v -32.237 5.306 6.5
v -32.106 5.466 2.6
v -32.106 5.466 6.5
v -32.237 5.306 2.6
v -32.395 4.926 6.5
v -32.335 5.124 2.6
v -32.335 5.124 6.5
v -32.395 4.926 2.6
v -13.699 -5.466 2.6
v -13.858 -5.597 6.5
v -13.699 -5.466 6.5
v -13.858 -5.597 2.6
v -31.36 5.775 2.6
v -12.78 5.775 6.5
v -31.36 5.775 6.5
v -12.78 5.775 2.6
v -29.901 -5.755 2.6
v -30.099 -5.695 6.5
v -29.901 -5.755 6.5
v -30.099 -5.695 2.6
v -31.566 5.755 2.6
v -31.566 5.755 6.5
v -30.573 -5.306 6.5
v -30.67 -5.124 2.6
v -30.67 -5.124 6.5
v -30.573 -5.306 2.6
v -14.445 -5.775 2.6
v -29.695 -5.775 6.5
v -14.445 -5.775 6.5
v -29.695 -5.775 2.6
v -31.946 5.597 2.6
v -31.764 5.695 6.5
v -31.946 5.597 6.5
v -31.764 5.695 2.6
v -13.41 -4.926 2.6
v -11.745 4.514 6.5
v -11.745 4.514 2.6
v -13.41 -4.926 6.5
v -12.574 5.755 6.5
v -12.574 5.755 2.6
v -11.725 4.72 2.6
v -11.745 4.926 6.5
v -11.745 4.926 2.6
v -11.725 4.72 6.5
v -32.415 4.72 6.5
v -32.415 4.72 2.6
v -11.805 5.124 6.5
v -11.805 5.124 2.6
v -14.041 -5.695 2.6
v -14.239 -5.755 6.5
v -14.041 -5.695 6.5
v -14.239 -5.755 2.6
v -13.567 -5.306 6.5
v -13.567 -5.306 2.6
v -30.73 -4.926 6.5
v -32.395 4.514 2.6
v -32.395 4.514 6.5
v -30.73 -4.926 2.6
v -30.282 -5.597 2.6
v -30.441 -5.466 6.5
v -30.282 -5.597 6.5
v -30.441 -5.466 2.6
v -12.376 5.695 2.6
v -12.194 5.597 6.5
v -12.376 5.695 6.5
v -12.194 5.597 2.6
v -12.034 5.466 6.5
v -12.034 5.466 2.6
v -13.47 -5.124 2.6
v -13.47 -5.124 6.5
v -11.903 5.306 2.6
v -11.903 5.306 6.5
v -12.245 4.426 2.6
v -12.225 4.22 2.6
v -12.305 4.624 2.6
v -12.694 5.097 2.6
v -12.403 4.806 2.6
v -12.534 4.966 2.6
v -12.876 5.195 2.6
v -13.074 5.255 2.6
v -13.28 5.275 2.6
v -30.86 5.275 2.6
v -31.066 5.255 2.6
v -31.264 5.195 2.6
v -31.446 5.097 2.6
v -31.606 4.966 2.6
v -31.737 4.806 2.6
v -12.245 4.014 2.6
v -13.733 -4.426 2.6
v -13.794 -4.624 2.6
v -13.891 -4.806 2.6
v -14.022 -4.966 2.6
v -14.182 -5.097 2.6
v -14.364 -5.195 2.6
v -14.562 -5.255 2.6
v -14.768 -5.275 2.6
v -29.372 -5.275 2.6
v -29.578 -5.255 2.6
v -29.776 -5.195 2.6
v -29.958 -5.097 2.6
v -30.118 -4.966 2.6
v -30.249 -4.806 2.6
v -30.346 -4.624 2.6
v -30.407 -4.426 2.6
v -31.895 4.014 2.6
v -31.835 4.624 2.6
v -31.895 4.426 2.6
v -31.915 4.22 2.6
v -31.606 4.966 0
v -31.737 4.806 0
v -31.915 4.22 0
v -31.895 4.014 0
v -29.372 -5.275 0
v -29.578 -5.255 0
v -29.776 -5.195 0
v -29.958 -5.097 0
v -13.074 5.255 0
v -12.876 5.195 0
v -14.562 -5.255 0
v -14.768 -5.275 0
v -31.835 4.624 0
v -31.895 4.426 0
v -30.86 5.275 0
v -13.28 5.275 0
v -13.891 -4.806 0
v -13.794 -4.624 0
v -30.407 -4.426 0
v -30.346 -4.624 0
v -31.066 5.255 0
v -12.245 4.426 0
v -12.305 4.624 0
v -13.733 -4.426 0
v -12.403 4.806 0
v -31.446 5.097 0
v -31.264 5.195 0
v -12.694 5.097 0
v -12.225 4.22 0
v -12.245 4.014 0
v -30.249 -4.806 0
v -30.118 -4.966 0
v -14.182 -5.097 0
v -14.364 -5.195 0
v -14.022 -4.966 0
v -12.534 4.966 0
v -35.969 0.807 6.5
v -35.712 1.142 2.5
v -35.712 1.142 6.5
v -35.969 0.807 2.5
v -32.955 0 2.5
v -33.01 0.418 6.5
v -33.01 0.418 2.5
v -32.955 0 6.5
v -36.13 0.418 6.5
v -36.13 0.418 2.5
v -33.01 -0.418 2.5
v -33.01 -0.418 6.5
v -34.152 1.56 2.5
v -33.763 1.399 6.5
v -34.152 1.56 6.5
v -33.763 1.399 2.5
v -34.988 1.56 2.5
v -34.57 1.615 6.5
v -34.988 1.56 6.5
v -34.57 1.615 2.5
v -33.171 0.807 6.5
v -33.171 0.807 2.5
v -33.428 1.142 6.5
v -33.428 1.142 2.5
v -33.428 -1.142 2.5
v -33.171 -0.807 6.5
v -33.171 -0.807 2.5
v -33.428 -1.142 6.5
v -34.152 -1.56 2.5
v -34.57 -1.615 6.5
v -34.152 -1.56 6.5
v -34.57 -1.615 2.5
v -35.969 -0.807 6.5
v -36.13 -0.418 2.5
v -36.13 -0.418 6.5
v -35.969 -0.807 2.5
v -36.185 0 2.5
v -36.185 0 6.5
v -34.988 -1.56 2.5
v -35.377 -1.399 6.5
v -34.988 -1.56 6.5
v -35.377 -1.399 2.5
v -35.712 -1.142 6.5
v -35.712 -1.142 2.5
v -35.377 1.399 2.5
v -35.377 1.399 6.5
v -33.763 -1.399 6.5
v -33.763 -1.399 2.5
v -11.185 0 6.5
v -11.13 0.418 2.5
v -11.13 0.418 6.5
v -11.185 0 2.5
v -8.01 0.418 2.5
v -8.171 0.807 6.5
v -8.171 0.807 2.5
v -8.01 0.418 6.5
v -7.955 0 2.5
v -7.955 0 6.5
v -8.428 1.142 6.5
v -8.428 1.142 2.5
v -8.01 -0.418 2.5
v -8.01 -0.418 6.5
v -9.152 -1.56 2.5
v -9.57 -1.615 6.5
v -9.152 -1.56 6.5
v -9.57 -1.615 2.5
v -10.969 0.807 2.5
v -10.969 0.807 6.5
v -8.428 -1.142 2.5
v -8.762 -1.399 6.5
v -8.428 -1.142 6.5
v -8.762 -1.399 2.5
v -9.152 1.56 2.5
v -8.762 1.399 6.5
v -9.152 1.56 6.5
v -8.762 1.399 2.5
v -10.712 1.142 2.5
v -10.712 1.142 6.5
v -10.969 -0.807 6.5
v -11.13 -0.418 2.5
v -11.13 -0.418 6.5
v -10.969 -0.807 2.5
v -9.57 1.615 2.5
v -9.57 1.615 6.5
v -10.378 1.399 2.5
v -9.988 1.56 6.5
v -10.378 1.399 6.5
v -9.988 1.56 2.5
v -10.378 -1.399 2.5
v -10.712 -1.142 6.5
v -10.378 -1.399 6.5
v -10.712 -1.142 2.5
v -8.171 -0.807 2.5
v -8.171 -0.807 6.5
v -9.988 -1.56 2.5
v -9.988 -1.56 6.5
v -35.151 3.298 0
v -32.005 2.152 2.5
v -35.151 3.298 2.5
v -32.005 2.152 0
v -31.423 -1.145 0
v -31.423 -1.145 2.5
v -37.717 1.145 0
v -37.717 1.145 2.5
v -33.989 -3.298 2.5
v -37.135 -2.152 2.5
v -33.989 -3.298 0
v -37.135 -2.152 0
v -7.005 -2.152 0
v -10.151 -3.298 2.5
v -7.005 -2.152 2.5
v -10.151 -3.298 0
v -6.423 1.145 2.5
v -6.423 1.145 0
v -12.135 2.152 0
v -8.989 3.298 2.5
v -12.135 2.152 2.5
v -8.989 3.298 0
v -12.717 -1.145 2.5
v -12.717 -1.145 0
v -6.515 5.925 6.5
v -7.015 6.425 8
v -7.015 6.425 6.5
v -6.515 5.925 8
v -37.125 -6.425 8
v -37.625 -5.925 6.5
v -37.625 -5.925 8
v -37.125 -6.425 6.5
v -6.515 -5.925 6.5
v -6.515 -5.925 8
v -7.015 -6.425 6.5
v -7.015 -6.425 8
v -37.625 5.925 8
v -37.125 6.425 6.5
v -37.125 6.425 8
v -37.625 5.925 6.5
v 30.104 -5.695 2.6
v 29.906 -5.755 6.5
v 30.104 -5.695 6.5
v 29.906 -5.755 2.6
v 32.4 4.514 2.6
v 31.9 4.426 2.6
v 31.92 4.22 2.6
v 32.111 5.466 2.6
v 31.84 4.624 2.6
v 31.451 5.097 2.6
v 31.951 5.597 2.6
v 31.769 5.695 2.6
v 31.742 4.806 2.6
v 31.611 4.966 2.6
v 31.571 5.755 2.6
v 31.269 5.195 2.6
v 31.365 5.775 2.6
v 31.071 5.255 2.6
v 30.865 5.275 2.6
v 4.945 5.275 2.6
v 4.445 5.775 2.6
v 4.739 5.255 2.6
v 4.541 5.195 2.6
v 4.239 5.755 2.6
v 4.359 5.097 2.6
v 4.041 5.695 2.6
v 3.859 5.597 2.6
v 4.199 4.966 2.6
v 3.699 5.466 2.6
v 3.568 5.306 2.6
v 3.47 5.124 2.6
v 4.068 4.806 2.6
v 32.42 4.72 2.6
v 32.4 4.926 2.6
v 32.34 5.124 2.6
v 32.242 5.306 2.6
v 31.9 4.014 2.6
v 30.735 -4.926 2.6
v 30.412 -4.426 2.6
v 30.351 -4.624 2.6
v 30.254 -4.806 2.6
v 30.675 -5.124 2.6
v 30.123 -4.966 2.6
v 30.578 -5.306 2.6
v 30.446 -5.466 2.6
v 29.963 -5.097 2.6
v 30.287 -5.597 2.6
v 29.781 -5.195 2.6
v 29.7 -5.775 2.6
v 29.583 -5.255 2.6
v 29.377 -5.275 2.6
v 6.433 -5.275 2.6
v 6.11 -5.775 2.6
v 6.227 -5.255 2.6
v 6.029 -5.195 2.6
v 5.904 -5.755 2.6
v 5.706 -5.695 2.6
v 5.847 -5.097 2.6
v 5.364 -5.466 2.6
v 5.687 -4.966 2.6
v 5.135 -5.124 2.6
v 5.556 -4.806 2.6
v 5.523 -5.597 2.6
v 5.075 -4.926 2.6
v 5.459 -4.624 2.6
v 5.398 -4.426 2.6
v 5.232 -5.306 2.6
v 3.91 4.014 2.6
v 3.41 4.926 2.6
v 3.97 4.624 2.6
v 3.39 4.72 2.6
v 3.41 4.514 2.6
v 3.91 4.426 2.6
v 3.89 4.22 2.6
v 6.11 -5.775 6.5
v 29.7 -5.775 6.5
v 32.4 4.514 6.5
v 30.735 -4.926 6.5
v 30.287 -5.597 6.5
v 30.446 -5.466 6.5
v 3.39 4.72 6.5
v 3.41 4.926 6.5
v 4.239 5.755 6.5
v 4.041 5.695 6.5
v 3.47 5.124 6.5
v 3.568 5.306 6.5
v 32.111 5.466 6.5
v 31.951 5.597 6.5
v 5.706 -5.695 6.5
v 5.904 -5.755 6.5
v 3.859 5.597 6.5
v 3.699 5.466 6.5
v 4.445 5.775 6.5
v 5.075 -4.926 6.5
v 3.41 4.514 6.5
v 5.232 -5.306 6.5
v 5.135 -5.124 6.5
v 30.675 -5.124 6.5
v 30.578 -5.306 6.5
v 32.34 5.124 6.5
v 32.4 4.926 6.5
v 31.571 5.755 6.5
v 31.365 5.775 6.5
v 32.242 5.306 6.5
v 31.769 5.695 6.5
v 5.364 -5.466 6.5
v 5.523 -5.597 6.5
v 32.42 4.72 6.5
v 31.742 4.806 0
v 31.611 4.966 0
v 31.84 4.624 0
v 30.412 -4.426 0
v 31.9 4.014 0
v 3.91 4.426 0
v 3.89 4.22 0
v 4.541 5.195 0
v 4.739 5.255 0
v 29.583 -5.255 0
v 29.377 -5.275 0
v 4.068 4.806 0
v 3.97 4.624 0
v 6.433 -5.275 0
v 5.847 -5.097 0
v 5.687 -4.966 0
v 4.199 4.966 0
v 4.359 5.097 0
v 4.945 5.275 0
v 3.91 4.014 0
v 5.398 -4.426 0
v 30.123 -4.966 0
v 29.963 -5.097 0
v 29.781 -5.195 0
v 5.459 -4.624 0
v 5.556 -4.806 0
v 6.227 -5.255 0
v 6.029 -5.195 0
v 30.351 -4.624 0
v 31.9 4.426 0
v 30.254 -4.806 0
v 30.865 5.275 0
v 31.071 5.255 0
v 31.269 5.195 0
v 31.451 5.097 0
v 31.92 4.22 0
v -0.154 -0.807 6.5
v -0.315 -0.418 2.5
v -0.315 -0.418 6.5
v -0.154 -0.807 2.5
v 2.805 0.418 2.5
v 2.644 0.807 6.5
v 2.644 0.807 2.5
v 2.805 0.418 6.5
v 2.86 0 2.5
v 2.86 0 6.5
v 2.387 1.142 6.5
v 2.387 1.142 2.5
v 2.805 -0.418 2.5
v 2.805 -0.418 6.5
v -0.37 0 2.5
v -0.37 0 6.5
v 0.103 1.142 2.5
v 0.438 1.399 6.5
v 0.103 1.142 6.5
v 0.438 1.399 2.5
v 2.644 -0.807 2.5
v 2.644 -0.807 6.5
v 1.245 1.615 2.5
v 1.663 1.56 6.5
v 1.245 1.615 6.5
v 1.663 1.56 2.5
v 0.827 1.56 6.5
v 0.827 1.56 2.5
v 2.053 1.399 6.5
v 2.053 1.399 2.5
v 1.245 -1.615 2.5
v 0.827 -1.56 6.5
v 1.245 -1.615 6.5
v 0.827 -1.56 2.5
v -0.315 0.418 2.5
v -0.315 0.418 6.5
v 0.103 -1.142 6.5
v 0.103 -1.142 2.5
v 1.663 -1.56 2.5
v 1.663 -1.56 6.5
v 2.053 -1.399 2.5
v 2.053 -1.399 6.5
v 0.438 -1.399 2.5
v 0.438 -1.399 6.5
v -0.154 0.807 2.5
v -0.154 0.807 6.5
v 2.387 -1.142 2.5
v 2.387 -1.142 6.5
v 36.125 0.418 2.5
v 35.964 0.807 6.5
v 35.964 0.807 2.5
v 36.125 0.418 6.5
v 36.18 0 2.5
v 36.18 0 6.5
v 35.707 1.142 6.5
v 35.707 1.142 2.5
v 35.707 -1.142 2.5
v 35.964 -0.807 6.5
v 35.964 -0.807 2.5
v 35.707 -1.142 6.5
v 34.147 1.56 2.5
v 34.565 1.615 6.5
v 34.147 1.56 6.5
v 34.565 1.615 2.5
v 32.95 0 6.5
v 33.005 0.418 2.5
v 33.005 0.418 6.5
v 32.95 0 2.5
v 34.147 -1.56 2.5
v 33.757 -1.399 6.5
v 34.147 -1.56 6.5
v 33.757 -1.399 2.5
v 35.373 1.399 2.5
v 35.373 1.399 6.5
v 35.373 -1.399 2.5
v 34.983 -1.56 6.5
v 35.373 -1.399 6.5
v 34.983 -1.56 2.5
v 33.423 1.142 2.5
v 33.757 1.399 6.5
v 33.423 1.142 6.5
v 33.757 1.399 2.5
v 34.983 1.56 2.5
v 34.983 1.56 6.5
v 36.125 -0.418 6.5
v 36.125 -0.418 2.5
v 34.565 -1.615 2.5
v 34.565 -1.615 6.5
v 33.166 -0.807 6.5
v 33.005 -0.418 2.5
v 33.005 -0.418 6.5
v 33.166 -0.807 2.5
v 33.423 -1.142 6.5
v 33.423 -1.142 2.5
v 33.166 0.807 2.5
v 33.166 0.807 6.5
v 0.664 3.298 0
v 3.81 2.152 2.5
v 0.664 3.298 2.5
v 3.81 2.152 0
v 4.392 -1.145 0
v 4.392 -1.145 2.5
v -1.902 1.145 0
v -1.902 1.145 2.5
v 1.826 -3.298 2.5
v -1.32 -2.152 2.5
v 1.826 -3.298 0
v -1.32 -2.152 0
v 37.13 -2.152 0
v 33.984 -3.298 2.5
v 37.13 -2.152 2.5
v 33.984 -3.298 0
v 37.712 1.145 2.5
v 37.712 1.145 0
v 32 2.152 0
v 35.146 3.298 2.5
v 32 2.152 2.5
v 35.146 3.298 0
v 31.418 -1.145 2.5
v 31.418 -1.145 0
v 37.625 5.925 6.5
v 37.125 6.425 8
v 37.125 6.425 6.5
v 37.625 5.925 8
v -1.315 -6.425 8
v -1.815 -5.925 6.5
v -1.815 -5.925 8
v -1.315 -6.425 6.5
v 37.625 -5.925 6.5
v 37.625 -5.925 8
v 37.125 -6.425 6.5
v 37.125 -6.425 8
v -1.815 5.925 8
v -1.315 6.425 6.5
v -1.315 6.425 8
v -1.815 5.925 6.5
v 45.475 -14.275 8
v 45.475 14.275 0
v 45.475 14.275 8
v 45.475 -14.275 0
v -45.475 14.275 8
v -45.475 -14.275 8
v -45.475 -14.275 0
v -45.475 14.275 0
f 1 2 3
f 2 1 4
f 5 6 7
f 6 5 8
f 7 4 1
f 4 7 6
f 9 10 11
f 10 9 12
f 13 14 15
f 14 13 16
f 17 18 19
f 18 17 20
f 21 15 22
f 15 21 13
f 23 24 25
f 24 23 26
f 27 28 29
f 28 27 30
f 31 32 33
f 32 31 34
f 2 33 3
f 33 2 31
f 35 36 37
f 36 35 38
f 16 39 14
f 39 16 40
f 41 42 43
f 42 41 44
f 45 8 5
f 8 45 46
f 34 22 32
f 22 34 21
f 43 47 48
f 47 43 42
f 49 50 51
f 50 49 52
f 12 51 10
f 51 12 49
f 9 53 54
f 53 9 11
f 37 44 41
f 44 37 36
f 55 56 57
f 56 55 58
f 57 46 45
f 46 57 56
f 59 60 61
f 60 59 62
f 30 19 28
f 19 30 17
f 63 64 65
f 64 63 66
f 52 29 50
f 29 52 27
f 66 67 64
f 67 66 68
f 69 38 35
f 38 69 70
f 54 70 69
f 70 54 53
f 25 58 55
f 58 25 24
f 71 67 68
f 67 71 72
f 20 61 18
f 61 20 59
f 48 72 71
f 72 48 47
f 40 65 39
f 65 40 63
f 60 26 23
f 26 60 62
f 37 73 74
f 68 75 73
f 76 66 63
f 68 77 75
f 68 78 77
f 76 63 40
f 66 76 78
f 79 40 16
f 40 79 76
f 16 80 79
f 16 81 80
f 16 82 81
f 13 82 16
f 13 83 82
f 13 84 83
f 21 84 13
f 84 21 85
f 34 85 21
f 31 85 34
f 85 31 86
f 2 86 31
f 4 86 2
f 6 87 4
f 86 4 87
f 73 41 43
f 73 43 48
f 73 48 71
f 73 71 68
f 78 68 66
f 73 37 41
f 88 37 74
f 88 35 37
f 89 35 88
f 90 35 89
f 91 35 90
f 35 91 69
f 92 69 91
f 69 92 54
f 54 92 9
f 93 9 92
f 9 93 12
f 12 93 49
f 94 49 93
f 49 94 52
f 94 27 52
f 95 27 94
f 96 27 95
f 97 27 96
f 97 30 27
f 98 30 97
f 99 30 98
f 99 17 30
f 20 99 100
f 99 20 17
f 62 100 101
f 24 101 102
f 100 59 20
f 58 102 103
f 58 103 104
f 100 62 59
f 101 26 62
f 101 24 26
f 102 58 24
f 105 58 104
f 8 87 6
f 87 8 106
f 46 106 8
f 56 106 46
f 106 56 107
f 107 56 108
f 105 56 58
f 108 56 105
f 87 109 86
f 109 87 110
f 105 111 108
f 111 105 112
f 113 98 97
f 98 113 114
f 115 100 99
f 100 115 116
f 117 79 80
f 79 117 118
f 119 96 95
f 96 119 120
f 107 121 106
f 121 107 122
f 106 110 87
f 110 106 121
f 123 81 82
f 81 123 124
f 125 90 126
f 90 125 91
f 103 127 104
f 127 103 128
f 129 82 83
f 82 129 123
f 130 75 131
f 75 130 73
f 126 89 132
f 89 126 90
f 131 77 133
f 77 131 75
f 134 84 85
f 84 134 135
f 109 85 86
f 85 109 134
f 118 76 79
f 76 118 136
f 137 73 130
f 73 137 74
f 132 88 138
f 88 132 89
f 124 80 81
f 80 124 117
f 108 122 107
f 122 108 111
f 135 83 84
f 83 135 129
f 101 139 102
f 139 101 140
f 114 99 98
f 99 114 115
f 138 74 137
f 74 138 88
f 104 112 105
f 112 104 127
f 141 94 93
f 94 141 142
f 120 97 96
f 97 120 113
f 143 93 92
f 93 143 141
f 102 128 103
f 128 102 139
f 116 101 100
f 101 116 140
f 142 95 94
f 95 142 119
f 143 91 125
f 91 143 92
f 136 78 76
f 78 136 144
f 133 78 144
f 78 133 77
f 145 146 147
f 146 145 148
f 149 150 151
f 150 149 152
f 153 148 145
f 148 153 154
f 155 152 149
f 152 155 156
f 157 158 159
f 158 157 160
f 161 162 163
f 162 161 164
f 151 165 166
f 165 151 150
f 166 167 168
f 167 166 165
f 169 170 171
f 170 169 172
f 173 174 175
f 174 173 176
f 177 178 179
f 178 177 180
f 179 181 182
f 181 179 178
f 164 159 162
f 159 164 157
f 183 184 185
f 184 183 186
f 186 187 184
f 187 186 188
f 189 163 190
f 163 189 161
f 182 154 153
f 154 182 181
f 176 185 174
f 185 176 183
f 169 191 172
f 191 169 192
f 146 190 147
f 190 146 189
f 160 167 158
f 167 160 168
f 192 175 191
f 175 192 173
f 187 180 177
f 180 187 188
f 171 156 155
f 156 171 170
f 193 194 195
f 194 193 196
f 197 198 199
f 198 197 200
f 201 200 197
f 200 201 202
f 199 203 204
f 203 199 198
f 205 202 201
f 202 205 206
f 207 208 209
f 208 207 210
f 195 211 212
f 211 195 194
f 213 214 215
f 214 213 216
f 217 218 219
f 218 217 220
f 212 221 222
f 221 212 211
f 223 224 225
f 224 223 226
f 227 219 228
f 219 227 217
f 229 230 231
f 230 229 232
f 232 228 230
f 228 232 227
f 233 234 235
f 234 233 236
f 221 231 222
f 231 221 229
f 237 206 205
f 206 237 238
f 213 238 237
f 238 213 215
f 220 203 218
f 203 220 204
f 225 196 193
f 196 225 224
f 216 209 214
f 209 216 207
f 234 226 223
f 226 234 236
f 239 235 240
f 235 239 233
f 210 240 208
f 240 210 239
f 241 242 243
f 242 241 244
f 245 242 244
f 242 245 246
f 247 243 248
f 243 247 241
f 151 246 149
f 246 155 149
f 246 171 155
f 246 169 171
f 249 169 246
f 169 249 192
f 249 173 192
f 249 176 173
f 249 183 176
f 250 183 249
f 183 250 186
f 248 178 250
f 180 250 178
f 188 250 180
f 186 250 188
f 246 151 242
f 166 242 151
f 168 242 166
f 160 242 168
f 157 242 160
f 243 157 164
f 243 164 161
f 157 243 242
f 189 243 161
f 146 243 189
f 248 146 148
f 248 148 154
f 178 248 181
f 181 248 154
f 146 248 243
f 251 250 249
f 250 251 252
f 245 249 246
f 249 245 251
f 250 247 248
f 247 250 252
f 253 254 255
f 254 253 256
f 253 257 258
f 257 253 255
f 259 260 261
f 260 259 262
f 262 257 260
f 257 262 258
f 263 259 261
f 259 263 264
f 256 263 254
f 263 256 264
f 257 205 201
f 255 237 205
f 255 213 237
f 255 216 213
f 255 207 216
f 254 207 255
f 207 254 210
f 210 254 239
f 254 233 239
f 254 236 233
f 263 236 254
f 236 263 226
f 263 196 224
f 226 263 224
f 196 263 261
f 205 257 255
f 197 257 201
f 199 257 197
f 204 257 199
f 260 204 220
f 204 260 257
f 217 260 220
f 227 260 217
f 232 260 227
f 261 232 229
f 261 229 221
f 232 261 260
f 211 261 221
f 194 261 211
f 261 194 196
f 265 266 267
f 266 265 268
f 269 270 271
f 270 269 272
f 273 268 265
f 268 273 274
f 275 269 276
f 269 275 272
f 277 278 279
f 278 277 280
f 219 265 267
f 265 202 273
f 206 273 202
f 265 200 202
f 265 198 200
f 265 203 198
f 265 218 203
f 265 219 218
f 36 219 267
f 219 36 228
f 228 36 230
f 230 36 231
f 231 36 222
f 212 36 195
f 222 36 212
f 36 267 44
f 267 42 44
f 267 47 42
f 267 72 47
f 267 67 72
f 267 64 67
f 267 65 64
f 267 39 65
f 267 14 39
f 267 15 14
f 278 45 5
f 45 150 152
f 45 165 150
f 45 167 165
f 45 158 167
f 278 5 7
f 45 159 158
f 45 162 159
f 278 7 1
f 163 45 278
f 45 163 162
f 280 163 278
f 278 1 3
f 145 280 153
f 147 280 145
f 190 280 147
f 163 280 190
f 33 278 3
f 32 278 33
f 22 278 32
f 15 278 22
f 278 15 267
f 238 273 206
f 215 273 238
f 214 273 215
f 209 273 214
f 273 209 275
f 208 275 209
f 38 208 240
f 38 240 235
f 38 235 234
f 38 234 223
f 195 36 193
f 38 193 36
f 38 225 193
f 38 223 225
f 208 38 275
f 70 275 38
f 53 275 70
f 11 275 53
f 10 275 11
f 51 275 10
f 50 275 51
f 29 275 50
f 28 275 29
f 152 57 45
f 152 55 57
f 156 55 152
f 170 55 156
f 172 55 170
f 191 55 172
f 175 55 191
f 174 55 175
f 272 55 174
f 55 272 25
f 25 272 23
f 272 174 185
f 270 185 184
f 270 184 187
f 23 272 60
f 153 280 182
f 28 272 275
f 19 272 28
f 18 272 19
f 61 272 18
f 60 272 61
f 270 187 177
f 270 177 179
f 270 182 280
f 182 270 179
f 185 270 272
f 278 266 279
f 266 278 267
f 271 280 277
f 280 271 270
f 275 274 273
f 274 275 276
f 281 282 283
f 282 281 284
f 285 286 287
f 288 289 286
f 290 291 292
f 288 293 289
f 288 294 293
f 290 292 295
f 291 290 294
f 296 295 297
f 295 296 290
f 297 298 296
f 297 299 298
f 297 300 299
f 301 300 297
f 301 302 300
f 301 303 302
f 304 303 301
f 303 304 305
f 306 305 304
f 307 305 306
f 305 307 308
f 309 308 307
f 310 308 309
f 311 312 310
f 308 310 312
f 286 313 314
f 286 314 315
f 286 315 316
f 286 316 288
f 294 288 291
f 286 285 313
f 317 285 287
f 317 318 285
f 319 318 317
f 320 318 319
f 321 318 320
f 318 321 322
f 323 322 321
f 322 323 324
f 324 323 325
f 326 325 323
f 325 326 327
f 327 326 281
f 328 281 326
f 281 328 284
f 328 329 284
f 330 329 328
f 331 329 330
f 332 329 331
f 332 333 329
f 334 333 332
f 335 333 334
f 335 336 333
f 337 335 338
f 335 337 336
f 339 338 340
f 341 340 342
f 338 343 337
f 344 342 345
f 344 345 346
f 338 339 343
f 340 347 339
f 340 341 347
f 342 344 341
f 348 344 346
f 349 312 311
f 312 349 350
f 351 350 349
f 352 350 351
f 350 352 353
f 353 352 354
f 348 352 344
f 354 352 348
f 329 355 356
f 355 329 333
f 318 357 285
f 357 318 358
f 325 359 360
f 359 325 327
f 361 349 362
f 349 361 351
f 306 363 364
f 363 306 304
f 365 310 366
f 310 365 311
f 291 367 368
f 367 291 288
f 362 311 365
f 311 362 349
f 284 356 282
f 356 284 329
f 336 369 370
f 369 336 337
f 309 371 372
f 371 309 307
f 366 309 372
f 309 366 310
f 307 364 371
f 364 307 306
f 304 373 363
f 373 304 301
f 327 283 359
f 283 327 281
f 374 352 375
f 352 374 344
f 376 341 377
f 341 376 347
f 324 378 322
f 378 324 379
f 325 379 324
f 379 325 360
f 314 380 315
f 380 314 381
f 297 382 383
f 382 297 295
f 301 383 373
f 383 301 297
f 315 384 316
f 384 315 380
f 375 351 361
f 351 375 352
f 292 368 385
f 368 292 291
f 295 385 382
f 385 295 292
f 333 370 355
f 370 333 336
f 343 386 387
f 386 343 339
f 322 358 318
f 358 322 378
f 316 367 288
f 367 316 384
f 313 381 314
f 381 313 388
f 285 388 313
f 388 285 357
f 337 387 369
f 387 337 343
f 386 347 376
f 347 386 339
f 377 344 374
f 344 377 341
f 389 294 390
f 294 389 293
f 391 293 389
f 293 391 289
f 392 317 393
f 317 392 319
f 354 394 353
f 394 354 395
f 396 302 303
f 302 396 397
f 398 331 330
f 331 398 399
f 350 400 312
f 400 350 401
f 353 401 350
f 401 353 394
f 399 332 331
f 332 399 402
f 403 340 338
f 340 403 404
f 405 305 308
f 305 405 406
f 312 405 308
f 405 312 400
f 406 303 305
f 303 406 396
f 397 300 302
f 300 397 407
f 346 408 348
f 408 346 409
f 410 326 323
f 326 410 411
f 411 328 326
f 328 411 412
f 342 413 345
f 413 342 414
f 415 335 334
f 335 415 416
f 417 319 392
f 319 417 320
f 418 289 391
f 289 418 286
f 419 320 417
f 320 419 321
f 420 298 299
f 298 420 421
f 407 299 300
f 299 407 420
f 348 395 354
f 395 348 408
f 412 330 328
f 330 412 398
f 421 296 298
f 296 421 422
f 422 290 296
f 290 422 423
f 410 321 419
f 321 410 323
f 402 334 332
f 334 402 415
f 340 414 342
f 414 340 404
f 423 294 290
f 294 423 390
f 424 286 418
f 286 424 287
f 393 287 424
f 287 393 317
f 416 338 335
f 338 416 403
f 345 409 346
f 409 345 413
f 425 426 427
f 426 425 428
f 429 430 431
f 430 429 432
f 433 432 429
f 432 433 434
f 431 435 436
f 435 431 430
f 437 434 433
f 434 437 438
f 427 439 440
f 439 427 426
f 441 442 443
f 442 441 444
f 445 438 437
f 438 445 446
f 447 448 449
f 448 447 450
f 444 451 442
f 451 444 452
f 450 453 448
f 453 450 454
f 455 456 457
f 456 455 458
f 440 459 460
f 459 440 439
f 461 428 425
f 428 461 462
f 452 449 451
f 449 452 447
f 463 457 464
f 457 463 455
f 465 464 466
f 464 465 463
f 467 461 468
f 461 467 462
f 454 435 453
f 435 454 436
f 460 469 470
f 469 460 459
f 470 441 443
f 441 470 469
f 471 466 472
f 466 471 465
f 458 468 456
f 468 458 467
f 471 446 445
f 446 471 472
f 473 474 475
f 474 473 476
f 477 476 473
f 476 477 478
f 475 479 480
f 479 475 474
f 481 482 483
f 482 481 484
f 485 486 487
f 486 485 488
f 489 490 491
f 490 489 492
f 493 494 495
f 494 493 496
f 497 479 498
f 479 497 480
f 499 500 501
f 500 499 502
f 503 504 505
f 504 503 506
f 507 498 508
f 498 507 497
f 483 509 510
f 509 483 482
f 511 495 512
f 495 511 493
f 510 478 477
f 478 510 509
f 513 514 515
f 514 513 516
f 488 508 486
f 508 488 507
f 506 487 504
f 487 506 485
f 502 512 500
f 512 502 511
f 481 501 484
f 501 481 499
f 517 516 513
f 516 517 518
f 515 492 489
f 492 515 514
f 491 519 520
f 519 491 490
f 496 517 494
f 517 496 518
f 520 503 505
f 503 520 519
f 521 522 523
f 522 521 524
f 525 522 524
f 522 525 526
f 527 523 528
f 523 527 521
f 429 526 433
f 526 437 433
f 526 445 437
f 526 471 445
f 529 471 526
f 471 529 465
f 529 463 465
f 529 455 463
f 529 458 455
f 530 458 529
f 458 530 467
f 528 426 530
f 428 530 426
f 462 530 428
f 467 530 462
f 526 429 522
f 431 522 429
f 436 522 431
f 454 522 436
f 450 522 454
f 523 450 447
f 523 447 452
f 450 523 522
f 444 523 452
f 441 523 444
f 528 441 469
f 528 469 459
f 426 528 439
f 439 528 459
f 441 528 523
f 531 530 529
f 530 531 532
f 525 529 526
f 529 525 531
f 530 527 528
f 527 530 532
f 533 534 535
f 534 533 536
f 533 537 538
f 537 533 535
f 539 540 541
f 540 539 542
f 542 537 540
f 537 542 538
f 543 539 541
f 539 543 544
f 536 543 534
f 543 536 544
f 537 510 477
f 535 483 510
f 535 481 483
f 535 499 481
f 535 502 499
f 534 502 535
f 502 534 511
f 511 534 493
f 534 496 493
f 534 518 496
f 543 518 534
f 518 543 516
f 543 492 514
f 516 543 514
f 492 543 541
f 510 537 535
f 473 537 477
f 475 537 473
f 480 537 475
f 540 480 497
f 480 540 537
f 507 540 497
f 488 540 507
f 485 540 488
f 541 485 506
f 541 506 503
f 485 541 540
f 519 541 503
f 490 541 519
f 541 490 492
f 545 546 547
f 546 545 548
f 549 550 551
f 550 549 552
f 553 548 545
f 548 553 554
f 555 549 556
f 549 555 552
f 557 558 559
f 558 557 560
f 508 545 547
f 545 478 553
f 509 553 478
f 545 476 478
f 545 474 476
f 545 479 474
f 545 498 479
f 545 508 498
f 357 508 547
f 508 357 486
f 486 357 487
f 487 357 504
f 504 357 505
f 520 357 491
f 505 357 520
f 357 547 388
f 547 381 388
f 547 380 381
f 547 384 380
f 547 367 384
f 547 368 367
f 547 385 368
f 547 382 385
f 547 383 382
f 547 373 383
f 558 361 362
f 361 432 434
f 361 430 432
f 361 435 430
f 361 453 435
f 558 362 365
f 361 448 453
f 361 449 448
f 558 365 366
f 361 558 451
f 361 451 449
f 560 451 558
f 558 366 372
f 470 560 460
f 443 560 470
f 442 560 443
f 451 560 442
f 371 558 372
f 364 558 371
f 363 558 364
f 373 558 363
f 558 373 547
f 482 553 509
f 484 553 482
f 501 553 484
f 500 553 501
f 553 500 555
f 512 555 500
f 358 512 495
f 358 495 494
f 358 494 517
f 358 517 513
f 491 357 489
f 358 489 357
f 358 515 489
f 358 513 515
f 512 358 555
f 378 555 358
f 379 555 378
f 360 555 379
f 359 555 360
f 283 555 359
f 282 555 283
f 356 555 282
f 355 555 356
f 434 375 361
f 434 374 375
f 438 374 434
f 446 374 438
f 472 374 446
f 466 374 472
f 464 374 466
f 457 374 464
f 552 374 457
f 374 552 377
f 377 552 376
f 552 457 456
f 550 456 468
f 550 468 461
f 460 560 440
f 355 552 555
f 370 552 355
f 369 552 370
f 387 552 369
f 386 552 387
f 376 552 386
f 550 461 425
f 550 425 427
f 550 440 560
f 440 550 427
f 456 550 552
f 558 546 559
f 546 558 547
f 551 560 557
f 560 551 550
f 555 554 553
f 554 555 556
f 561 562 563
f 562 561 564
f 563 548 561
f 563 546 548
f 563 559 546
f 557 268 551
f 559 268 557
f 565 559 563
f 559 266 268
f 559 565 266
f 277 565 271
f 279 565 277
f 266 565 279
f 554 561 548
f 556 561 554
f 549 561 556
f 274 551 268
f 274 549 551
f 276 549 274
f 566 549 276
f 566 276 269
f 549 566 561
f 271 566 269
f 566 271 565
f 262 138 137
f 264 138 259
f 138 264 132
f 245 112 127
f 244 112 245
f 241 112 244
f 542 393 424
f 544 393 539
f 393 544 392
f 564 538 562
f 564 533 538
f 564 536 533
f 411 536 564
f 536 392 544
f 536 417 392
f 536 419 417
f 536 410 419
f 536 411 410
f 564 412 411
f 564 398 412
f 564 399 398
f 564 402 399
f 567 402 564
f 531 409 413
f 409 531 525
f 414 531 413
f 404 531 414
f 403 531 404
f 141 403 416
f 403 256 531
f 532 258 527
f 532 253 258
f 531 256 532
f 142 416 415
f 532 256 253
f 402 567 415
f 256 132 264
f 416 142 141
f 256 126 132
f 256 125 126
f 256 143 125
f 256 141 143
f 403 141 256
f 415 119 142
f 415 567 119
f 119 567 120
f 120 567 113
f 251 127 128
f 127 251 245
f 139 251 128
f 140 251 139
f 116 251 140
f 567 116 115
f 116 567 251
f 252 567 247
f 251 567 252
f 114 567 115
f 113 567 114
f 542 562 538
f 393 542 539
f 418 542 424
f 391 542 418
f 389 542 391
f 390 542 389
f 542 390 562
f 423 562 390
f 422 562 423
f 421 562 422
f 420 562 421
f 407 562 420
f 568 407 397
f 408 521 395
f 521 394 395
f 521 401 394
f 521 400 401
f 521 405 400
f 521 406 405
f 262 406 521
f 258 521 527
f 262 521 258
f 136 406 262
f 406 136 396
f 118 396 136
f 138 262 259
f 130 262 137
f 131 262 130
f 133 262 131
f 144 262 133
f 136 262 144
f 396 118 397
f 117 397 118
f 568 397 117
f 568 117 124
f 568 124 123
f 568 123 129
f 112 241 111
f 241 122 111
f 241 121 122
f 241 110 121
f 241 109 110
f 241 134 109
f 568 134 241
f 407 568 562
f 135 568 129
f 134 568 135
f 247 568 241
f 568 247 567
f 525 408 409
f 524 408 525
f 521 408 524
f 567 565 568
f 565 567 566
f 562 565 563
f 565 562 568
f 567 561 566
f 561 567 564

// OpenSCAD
// サンプル: DE-9 と DA-15 を横に並べたテスト用パネル
// ライブラリの基本的な使い方を示すシンプルな例
//
// 外形: 約92mm x 29mm x 8mm
// 使用コネクタ: DE-9 x1, DA-15 x1
// 依存: dsub_panel_mount.scad

use <../dsub_panel_mount.scad>

// パラメータ (ライブラリと同じ値を設定)
plate_thickness = 8;
plate_margin = 8;

// ブラケット寸法
db9_w = 30.81;   // DE-9 bracket width
db15_w = 39.14;  // DA-15 bracket width
bracket_h = 12.55;
h_spacing = 5;

// パネルサイズ
test_width = db9_w + db15_w + h_spacing + plate_margin * 2;
test_height = bracket_h + plate_margin * 2;

difference() {
    // 板
    translate([-test_width/2, -test_height/2, 0])
        cube([test_width, test_height, plate_thickness]);

    // DE-9
    translate([-(db15_w + h_spacing) / 2, 0, 0])
        de9_cutout();

    // DA-15
    translate([(db9_w + h_spacing) / 2, 0, 0])
        da15_cutout();
}
